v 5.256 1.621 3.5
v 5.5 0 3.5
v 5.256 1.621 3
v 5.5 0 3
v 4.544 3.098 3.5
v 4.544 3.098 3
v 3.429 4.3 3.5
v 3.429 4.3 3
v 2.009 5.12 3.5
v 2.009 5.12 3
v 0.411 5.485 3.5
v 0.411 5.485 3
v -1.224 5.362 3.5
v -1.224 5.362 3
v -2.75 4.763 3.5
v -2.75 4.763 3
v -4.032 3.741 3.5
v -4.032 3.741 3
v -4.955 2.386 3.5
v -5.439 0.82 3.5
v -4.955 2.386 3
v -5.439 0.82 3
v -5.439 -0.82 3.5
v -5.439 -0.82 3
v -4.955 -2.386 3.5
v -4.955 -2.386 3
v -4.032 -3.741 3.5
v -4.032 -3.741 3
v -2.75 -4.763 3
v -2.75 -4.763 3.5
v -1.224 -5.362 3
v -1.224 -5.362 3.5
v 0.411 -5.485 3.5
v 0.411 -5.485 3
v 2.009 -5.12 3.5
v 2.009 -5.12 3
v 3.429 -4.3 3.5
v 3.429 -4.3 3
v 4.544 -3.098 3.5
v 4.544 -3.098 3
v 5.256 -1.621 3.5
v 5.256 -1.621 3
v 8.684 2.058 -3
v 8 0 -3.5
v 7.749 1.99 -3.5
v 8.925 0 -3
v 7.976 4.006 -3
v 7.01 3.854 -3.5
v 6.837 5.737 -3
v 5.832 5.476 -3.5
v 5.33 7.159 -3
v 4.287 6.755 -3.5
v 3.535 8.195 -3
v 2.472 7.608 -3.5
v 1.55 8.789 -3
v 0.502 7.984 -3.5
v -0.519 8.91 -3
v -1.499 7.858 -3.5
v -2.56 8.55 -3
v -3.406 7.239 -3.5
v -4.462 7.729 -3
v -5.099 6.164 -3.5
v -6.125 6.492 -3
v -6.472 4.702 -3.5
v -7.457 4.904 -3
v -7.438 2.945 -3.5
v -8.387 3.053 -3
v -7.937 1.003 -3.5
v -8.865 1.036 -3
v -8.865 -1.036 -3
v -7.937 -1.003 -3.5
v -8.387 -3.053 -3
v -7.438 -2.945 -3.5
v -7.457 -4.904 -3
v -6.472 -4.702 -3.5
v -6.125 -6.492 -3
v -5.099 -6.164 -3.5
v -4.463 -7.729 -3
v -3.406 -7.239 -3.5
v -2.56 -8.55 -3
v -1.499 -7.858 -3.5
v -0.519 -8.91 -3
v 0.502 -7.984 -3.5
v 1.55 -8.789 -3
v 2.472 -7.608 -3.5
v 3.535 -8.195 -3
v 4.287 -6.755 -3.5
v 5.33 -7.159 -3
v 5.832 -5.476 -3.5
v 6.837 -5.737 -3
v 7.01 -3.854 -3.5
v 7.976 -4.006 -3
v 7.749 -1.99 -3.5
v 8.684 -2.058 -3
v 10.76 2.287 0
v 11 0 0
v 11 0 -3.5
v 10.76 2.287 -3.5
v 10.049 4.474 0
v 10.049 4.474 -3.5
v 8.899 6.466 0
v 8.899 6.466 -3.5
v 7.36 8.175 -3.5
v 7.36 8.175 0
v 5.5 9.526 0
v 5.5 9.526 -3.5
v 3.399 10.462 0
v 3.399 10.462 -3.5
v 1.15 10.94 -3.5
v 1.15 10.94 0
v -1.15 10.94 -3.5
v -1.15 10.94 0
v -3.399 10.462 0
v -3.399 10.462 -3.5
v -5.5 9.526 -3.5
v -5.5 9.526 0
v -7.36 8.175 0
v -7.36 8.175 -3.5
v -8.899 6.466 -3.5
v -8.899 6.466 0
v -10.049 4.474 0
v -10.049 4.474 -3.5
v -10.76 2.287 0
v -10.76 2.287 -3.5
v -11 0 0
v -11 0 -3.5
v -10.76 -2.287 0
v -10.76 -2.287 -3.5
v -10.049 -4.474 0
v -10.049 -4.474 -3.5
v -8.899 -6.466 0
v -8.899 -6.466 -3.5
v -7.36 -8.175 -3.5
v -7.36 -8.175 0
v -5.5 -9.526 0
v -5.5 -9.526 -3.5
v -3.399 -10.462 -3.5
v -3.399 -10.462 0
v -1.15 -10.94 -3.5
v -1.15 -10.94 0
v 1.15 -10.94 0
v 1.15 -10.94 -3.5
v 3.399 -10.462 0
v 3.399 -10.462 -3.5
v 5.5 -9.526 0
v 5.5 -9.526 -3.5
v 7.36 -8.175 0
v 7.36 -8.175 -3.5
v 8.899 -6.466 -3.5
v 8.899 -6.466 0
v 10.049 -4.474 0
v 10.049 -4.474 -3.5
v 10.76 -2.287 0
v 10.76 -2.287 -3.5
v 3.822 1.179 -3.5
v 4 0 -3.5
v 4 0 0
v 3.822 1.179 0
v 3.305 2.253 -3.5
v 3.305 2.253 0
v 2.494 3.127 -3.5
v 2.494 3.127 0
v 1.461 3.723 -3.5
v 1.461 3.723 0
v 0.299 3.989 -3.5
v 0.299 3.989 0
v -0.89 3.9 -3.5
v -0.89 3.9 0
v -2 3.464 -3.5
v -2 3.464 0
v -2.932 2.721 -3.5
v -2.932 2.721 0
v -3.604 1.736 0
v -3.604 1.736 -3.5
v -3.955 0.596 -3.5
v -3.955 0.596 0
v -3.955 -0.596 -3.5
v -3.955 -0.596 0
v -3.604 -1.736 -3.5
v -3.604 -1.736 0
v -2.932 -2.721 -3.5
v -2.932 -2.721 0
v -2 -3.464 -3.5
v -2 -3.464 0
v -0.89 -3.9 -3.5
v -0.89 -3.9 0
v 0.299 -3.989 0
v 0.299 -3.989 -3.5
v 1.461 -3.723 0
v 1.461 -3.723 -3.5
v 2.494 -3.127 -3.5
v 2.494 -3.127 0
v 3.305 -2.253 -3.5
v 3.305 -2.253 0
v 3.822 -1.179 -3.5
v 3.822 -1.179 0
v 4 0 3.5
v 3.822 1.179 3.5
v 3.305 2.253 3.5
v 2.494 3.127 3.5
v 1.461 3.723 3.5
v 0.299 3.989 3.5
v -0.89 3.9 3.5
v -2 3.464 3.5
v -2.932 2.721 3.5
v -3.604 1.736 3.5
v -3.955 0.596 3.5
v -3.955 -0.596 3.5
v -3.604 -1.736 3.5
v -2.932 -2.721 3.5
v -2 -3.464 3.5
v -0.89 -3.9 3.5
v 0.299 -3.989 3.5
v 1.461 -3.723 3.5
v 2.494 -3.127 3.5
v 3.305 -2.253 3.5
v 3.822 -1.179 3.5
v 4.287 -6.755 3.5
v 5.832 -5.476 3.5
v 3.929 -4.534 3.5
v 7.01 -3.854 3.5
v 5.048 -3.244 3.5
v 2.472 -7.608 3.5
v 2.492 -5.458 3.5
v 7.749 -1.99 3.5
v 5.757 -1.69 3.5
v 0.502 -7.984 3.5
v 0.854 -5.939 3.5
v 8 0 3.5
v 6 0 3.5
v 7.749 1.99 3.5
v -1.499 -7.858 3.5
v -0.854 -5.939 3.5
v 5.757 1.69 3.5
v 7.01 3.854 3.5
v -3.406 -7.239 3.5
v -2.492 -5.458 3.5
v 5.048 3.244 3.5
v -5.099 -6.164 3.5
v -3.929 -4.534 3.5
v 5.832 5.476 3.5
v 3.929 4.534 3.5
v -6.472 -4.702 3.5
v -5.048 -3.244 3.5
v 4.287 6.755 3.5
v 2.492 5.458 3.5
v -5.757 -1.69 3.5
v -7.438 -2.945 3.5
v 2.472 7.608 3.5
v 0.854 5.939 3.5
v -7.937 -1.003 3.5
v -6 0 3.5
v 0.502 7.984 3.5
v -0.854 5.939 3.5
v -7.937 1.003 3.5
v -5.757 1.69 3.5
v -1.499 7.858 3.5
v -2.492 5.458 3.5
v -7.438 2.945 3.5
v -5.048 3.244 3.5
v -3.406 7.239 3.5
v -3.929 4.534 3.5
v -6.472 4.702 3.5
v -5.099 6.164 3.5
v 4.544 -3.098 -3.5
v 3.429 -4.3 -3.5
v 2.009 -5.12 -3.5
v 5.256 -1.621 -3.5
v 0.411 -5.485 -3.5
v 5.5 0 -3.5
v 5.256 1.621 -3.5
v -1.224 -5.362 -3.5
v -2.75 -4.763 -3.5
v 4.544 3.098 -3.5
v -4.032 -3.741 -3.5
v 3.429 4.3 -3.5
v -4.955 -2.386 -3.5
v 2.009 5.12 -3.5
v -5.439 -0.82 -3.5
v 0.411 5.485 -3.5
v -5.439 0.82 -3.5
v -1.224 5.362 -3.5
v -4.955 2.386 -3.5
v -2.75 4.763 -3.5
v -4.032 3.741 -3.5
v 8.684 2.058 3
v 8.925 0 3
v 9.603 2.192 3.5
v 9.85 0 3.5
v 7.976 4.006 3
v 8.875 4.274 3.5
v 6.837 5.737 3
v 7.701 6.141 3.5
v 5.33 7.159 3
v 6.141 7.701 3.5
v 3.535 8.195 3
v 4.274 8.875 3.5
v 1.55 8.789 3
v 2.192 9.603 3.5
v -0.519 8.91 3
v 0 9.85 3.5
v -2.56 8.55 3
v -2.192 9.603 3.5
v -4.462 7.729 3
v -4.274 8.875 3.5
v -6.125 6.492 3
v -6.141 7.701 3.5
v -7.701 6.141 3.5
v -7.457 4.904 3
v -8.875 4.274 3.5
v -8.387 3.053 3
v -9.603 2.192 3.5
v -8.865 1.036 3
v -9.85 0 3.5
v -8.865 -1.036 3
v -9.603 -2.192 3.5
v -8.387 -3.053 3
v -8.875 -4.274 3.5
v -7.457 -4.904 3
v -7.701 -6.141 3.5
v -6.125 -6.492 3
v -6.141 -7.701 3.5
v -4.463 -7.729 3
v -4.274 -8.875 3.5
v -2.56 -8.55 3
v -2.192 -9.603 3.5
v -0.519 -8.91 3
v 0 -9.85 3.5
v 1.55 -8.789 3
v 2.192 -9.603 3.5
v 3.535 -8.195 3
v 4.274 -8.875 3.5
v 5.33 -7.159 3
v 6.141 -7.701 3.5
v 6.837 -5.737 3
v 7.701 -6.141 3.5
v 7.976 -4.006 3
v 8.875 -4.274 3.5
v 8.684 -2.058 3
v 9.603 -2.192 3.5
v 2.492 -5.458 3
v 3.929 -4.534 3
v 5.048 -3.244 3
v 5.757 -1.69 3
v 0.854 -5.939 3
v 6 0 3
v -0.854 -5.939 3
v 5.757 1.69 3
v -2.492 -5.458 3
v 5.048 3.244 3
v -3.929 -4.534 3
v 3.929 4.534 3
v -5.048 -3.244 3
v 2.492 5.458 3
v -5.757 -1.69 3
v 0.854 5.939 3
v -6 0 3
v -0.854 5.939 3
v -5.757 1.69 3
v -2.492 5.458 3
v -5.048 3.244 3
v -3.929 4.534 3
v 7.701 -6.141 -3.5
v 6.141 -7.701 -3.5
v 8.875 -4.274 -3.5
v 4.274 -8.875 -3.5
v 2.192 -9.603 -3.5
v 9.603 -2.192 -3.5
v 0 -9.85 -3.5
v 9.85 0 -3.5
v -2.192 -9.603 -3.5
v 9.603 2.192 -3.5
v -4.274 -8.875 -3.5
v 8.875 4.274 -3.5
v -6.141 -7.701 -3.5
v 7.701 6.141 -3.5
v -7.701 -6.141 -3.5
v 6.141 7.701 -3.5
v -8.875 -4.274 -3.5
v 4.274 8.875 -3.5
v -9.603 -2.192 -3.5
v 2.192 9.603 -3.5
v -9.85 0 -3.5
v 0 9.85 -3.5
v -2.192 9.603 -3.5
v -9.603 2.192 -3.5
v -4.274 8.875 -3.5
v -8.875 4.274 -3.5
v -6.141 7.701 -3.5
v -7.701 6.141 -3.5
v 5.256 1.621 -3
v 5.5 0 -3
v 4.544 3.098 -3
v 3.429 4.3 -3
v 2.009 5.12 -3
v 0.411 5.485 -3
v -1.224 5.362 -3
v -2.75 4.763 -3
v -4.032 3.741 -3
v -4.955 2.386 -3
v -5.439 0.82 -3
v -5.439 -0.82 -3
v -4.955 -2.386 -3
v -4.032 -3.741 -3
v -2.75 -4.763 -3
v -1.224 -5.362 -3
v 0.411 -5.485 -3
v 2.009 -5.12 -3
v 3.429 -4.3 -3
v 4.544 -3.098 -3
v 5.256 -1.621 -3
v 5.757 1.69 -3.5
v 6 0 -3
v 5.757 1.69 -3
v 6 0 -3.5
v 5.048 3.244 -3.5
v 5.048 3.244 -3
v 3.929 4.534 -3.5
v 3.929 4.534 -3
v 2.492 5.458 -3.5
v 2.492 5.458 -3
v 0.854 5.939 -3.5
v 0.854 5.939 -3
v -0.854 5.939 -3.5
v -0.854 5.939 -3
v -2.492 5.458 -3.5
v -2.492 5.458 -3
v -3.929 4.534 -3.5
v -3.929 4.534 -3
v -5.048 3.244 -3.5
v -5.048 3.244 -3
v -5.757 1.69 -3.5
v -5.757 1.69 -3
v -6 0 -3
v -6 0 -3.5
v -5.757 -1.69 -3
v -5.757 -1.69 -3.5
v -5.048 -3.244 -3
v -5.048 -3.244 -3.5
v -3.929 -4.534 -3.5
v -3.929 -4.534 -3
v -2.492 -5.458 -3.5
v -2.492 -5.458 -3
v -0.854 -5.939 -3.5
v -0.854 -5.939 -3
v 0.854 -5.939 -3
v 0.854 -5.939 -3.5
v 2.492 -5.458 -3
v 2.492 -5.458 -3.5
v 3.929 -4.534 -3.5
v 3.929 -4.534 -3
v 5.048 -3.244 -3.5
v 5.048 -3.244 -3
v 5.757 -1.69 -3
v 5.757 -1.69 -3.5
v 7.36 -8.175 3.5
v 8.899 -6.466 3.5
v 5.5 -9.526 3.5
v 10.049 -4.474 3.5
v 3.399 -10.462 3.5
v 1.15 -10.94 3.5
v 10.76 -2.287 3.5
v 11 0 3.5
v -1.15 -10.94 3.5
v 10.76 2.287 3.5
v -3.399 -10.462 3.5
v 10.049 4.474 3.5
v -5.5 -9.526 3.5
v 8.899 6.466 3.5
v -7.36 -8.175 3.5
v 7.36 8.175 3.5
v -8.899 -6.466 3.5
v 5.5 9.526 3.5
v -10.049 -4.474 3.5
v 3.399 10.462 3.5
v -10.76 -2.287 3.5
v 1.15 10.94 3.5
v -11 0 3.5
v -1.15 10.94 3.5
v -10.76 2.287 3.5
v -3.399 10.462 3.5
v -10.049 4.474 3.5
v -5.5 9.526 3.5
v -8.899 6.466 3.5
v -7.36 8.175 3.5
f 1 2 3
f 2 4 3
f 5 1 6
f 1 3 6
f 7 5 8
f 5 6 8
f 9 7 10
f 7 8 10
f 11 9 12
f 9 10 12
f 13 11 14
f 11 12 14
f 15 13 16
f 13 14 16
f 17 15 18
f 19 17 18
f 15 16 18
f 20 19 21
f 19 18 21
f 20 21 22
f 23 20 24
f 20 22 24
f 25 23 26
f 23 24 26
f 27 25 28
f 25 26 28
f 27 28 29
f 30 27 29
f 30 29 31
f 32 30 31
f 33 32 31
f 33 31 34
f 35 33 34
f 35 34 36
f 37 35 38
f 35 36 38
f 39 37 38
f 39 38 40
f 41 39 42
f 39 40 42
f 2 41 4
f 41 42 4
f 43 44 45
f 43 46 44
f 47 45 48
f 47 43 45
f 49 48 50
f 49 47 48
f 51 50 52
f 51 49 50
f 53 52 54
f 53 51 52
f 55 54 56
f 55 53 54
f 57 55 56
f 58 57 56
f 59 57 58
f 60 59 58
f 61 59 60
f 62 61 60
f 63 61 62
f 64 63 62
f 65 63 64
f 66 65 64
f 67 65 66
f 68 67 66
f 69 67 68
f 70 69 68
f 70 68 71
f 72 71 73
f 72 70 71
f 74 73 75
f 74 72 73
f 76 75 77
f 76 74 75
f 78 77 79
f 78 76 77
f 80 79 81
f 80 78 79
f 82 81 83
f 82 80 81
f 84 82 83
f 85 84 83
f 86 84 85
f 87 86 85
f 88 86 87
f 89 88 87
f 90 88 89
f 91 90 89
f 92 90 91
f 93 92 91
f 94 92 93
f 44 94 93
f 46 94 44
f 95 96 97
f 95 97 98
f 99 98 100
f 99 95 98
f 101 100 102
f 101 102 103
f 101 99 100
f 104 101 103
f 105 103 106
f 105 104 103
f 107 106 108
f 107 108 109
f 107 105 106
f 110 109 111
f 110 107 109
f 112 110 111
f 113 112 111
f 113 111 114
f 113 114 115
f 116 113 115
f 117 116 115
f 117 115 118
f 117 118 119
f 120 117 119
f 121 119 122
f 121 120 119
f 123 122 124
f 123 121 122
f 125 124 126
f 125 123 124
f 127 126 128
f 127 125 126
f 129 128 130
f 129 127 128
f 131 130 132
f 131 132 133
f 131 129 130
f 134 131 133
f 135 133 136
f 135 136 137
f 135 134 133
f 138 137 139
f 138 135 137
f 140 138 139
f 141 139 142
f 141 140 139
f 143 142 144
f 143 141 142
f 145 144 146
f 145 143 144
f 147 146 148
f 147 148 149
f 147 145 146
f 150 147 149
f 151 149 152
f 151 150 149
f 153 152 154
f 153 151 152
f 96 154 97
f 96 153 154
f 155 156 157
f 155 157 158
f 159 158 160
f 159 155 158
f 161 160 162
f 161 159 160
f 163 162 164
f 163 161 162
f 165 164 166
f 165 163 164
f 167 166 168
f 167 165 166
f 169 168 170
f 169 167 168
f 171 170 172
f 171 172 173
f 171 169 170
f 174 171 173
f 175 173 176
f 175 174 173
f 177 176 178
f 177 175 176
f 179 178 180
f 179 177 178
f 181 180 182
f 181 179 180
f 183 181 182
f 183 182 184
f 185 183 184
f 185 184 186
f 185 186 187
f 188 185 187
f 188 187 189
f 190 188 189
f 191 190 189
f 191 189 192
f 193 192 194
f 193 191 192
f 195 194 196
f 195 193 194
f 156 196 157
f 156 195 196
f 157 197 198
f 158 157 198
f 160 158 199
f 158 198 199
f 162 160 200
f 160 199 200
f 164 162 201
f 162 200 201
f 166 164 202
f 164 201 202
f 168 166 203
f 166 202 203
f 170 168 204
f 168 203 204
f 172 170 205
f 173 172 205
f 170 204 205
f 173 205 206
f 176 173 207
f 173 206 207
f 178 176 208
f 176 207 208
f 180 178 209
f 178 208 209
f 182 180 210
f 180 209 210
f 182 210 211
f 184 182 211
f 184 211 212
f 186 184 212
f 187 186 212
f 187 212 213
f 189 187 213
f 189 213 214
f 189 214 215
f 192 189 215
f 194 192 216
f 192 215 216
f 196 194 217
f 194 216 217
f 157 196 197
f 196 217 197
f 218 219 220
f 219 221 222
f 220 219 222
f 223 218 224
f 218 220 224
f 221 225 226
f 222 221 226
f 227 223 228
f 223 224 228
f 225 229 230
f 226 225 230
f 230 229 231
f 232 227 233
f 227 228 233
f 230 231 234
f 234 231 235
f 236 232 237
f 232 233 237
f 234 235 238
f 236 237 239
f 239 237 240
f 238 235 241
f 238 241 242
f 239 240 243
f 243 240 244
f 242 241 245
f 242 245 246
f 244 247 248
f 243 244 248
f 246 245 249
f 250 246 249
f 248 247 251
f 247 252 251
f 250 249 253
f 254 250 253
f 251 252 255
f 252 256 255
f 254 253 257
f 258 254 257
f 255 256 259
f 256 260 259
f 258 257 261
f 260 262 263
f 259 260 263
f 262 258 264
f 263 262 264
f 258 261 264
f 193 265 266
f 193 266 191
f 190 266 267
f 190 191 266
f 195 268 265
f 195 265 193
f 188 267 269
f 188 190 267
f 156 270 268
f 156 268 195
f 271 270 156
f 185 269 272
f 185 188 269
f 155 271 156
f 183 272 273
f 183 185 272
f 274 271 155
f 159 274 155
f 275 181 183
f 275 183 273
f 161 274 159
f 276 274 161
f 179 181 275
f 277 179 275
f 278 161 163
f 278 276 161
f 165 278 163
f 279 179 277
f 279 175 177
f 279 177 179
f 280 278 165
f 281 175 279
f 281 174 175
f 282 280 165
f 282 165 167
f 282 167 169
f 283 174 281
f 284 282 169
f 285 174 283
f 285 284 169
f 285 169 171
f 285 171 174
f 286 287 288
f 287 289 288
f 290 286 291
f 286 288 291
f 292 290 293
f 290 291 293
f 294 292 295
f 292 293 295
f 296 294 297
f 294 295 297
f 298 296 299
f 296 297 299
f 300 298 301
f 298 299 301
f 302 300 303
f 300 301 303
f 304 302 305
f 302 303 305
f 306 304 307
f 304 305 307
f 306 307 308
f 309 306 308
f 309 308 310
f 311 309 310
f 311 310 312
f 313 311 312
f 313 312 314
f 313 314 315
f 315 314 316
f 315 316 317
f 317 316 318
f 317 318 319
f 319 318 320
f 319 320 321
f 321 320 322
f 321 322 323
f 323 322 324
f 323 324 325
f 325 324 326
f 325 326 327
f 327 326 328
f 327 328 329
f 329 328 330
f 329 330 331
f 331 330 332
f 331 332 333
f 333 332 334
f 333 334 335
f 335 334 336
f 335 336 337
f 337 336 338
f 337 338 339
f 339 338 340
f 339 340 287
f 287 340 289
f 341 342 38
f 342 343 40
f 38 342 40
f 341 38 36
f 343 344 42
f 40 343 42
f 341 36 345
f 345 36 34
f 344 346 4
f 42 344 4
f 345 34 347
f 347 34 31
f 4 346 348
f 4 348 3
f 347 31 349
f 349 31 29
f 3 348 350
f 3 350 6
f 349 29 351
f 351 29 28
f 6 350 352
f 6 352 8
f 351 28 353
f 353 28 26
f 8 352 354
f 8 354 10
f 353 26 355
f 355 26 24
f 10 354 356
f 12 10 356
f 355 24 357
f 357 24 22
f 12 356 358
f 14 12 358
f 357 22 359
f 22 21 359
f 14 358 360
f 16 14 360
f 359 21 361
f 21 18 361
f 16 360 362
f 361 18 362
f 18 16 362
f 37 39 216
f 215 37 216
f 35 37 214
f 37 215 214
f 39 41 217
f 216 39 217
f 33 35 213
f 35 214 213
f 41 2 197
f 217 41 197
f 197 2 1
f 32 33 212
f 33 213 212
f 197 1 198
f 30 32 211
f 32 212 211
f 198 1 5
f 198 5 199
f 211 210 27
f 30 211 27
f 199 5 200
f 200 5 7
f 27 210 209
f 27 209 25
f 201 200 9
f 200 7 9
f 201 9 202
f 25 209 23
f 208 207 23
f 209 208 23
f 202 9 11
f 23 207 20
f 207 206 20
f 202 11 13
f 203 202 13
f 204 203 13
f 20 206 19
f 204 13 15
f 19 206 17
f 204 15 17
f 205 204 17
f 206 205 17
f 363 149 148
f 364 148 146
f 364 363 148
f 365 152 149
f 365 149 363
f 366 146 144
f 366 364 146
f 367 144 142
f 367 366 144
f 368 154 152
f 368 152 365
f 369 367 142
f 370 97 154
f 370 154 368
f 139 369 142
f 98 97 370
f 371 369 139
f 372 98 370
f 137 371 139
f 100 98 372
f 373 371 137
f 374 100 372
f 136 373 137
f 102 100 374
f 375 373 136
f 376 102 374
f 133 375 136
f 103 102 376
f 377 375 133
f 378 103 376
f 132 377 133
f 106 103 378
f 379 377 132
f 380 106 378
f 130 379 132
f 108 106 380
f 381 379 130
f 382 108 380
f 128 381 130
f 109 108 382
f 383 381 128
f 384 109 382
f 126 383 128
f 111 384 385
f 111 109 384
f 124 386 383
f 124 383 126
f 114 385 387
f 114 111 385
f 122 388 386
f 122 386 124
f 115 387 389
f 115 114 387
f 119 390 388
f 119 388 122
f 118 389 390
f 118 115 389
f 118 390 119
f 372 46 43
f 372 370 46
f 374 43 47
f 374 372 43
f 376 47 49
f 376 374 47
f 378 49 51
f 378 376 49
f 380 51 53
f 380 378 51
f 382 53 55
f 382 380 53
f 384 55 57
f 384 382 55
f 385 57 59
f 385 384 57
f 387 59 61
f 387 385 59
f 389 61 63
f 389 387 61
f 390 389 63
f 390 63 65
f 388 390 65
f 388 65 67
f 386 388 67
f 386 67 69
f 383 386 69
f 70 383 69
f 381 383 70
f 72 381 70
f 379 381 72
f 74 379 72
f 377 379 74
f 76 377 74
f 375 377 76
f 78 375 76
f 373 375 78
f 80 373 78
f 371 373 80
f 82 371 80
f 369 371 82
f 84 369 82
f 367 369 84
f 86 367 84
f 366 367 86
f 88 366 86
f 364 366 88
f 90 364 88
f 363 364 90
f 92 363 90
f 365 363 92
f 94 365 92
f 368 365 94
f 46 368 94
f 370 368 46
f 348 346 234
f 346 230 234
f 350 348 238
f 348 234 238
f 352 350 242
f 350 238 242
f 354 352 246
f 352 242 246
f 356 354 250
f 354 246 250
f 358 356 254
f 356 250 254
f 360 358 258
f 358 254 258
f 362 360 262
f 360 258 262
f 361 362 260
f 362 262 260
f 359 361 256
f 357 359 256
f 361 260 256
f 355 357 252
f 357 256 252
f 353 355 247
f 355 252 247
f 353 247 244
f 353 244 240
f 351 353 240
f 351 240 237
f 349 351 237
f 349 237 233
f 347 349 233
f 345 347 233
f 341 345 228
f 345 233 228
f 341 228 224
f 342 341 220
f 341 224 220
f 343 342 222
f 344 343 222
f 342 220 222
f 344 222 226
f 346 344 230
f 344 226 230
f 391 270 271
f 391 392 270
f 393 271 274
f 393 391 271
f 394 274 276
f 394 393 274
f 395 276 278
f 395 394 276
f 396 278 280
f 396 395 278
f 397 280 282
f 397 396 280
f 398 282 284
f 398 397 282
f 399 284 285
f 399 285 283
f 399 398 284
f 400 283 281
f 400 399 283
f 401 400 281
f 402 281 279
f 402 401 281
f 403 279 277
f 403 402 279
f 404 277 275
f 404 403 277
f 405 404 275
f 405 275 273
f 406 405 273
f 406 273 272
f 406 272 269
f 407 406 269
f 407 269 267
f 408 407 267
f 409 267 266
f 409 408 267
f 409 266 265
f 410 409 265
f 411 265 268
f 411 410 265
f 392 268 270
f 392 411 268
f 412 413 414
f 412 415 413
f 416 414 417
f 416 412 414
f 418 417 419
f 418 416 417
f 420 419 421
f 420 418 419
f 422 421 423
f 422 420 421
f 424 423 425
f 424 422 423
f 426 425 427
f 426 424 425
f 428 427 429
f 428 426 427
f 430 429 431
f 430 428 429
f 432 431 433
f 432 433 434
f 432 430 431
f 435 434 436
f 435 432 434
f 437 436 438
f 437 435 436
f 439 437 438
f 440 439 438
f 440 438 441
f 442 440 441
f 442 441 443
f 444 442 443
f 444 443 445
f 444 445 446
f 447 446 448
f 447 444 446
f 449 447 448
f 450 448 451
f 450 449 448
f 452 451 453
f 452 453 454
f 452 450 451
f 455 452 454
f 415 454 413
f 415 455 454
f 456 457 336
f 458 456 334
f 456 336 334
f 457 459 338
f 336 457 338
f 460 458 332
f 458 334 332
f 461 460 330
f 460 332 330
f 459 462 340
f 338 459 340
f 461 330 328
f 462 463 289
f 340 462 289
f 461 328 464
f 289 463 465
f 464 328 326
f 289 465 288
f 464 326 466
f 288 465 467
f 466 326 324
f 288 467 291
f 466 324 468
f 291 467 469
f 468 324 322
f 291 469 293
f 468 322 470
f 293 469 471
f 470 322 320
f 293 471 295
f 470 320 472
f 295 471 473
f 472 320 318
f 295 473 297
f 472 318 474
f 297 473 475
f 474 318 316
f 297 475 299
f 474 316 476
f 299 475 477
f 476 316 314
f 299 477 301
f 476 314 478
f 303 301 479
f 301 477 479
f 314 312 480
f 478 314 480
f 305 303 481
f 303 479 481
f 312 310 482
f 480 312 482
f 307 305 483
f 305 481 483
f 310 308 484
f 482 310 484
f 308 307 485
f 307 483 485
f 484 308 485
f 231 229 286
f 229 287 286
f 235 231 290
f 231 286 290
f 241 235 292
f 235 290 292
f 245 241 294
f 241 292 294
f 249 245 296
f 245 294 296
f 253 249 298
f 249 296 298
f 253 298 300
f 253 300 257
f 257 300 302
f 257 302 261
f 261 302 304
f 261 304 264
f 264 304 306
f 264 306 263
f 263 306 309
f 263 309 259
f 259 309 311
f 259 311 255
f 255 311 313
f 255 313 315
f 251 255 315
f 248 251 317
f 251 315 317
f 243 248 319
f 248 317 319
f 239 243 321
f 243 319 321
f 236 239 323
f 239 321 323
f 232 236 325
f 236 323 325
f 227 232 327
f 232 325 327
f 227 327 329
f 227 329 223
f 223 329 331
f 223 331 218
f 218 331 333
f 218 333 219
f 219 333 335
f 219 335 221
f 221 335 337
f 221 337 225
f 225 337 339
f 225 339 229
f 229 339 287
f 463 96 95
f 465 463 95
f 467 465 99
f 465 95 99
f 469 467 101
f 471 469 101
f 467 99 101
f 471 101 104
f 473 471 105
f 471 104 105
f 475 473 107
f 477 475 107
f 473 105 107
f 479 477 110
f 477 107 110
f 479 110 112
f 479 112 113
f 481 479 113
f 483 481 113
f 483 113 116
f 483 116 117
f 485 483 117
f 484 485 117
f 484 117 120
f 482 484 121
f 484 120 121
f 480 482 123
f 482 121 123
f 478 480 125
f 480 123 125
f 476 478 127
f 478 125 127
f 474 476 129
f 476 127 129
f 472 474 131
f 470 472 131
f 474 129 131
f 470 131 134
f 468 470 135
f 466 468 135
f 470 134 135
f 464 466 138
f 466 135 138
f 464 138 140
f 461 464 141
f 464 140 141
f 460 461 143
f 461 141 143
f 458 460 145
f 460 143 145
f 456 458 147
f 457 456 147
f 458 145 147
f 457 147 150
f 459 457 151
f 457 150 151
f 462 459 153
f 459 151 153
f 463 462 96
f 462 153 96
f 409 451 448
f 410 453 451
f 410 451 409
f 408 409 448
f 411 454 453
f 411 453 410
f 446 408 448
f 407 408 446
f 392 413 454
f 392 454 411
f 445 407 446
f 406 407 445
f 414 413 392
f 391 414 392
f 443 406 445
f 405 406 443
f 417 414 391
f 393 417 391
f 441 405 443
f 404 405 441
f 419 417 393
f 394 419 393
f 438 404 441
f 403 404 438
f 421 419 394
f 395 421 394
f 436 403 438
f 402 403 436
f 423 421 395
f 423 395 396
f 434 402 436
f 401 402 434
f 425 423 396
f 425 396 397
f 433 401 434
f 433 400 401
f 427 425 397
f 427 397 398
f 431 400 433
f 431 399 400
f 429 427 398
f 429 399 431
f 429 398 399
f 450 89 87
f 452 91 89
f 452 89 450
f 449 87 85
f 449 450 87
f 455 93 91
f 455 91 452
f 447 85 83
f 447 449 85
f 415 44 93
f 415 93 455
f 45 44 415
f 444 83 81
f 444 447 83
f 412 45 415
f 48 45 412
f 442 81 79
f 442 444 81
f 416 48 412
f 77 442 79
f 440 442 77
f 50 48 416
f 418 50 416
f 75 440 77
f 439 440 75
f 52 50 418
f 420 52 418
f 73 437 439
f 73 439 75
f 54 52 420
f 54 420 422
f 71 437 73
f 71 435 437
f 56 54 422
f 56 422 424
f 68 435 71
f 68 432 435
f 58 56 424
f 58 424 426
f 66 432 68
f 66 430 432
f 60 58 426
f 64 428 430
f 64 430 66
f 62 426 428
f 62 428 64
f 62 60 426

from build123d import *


with BuildPart() as part:
    # Sketch → Revolution (revolve)
    with BuildSketch(Plane.XZ):
        Polygon((4, 0), (4, 3.5), (5.5, 3.5), (5.5, 3), (6, 3), (6, 3.5), (8, 3.5), (8.925, 3), (9.85, 3.5), (11, 3.5), (11, 0), align=None)
    revolution = revolve(axis=Axis((0, 0, 0), (0, 0, 1)))

    # Mirrored: Revolution across XY
    add(revolution.mirror(Plane.XY))


solid = part.part
